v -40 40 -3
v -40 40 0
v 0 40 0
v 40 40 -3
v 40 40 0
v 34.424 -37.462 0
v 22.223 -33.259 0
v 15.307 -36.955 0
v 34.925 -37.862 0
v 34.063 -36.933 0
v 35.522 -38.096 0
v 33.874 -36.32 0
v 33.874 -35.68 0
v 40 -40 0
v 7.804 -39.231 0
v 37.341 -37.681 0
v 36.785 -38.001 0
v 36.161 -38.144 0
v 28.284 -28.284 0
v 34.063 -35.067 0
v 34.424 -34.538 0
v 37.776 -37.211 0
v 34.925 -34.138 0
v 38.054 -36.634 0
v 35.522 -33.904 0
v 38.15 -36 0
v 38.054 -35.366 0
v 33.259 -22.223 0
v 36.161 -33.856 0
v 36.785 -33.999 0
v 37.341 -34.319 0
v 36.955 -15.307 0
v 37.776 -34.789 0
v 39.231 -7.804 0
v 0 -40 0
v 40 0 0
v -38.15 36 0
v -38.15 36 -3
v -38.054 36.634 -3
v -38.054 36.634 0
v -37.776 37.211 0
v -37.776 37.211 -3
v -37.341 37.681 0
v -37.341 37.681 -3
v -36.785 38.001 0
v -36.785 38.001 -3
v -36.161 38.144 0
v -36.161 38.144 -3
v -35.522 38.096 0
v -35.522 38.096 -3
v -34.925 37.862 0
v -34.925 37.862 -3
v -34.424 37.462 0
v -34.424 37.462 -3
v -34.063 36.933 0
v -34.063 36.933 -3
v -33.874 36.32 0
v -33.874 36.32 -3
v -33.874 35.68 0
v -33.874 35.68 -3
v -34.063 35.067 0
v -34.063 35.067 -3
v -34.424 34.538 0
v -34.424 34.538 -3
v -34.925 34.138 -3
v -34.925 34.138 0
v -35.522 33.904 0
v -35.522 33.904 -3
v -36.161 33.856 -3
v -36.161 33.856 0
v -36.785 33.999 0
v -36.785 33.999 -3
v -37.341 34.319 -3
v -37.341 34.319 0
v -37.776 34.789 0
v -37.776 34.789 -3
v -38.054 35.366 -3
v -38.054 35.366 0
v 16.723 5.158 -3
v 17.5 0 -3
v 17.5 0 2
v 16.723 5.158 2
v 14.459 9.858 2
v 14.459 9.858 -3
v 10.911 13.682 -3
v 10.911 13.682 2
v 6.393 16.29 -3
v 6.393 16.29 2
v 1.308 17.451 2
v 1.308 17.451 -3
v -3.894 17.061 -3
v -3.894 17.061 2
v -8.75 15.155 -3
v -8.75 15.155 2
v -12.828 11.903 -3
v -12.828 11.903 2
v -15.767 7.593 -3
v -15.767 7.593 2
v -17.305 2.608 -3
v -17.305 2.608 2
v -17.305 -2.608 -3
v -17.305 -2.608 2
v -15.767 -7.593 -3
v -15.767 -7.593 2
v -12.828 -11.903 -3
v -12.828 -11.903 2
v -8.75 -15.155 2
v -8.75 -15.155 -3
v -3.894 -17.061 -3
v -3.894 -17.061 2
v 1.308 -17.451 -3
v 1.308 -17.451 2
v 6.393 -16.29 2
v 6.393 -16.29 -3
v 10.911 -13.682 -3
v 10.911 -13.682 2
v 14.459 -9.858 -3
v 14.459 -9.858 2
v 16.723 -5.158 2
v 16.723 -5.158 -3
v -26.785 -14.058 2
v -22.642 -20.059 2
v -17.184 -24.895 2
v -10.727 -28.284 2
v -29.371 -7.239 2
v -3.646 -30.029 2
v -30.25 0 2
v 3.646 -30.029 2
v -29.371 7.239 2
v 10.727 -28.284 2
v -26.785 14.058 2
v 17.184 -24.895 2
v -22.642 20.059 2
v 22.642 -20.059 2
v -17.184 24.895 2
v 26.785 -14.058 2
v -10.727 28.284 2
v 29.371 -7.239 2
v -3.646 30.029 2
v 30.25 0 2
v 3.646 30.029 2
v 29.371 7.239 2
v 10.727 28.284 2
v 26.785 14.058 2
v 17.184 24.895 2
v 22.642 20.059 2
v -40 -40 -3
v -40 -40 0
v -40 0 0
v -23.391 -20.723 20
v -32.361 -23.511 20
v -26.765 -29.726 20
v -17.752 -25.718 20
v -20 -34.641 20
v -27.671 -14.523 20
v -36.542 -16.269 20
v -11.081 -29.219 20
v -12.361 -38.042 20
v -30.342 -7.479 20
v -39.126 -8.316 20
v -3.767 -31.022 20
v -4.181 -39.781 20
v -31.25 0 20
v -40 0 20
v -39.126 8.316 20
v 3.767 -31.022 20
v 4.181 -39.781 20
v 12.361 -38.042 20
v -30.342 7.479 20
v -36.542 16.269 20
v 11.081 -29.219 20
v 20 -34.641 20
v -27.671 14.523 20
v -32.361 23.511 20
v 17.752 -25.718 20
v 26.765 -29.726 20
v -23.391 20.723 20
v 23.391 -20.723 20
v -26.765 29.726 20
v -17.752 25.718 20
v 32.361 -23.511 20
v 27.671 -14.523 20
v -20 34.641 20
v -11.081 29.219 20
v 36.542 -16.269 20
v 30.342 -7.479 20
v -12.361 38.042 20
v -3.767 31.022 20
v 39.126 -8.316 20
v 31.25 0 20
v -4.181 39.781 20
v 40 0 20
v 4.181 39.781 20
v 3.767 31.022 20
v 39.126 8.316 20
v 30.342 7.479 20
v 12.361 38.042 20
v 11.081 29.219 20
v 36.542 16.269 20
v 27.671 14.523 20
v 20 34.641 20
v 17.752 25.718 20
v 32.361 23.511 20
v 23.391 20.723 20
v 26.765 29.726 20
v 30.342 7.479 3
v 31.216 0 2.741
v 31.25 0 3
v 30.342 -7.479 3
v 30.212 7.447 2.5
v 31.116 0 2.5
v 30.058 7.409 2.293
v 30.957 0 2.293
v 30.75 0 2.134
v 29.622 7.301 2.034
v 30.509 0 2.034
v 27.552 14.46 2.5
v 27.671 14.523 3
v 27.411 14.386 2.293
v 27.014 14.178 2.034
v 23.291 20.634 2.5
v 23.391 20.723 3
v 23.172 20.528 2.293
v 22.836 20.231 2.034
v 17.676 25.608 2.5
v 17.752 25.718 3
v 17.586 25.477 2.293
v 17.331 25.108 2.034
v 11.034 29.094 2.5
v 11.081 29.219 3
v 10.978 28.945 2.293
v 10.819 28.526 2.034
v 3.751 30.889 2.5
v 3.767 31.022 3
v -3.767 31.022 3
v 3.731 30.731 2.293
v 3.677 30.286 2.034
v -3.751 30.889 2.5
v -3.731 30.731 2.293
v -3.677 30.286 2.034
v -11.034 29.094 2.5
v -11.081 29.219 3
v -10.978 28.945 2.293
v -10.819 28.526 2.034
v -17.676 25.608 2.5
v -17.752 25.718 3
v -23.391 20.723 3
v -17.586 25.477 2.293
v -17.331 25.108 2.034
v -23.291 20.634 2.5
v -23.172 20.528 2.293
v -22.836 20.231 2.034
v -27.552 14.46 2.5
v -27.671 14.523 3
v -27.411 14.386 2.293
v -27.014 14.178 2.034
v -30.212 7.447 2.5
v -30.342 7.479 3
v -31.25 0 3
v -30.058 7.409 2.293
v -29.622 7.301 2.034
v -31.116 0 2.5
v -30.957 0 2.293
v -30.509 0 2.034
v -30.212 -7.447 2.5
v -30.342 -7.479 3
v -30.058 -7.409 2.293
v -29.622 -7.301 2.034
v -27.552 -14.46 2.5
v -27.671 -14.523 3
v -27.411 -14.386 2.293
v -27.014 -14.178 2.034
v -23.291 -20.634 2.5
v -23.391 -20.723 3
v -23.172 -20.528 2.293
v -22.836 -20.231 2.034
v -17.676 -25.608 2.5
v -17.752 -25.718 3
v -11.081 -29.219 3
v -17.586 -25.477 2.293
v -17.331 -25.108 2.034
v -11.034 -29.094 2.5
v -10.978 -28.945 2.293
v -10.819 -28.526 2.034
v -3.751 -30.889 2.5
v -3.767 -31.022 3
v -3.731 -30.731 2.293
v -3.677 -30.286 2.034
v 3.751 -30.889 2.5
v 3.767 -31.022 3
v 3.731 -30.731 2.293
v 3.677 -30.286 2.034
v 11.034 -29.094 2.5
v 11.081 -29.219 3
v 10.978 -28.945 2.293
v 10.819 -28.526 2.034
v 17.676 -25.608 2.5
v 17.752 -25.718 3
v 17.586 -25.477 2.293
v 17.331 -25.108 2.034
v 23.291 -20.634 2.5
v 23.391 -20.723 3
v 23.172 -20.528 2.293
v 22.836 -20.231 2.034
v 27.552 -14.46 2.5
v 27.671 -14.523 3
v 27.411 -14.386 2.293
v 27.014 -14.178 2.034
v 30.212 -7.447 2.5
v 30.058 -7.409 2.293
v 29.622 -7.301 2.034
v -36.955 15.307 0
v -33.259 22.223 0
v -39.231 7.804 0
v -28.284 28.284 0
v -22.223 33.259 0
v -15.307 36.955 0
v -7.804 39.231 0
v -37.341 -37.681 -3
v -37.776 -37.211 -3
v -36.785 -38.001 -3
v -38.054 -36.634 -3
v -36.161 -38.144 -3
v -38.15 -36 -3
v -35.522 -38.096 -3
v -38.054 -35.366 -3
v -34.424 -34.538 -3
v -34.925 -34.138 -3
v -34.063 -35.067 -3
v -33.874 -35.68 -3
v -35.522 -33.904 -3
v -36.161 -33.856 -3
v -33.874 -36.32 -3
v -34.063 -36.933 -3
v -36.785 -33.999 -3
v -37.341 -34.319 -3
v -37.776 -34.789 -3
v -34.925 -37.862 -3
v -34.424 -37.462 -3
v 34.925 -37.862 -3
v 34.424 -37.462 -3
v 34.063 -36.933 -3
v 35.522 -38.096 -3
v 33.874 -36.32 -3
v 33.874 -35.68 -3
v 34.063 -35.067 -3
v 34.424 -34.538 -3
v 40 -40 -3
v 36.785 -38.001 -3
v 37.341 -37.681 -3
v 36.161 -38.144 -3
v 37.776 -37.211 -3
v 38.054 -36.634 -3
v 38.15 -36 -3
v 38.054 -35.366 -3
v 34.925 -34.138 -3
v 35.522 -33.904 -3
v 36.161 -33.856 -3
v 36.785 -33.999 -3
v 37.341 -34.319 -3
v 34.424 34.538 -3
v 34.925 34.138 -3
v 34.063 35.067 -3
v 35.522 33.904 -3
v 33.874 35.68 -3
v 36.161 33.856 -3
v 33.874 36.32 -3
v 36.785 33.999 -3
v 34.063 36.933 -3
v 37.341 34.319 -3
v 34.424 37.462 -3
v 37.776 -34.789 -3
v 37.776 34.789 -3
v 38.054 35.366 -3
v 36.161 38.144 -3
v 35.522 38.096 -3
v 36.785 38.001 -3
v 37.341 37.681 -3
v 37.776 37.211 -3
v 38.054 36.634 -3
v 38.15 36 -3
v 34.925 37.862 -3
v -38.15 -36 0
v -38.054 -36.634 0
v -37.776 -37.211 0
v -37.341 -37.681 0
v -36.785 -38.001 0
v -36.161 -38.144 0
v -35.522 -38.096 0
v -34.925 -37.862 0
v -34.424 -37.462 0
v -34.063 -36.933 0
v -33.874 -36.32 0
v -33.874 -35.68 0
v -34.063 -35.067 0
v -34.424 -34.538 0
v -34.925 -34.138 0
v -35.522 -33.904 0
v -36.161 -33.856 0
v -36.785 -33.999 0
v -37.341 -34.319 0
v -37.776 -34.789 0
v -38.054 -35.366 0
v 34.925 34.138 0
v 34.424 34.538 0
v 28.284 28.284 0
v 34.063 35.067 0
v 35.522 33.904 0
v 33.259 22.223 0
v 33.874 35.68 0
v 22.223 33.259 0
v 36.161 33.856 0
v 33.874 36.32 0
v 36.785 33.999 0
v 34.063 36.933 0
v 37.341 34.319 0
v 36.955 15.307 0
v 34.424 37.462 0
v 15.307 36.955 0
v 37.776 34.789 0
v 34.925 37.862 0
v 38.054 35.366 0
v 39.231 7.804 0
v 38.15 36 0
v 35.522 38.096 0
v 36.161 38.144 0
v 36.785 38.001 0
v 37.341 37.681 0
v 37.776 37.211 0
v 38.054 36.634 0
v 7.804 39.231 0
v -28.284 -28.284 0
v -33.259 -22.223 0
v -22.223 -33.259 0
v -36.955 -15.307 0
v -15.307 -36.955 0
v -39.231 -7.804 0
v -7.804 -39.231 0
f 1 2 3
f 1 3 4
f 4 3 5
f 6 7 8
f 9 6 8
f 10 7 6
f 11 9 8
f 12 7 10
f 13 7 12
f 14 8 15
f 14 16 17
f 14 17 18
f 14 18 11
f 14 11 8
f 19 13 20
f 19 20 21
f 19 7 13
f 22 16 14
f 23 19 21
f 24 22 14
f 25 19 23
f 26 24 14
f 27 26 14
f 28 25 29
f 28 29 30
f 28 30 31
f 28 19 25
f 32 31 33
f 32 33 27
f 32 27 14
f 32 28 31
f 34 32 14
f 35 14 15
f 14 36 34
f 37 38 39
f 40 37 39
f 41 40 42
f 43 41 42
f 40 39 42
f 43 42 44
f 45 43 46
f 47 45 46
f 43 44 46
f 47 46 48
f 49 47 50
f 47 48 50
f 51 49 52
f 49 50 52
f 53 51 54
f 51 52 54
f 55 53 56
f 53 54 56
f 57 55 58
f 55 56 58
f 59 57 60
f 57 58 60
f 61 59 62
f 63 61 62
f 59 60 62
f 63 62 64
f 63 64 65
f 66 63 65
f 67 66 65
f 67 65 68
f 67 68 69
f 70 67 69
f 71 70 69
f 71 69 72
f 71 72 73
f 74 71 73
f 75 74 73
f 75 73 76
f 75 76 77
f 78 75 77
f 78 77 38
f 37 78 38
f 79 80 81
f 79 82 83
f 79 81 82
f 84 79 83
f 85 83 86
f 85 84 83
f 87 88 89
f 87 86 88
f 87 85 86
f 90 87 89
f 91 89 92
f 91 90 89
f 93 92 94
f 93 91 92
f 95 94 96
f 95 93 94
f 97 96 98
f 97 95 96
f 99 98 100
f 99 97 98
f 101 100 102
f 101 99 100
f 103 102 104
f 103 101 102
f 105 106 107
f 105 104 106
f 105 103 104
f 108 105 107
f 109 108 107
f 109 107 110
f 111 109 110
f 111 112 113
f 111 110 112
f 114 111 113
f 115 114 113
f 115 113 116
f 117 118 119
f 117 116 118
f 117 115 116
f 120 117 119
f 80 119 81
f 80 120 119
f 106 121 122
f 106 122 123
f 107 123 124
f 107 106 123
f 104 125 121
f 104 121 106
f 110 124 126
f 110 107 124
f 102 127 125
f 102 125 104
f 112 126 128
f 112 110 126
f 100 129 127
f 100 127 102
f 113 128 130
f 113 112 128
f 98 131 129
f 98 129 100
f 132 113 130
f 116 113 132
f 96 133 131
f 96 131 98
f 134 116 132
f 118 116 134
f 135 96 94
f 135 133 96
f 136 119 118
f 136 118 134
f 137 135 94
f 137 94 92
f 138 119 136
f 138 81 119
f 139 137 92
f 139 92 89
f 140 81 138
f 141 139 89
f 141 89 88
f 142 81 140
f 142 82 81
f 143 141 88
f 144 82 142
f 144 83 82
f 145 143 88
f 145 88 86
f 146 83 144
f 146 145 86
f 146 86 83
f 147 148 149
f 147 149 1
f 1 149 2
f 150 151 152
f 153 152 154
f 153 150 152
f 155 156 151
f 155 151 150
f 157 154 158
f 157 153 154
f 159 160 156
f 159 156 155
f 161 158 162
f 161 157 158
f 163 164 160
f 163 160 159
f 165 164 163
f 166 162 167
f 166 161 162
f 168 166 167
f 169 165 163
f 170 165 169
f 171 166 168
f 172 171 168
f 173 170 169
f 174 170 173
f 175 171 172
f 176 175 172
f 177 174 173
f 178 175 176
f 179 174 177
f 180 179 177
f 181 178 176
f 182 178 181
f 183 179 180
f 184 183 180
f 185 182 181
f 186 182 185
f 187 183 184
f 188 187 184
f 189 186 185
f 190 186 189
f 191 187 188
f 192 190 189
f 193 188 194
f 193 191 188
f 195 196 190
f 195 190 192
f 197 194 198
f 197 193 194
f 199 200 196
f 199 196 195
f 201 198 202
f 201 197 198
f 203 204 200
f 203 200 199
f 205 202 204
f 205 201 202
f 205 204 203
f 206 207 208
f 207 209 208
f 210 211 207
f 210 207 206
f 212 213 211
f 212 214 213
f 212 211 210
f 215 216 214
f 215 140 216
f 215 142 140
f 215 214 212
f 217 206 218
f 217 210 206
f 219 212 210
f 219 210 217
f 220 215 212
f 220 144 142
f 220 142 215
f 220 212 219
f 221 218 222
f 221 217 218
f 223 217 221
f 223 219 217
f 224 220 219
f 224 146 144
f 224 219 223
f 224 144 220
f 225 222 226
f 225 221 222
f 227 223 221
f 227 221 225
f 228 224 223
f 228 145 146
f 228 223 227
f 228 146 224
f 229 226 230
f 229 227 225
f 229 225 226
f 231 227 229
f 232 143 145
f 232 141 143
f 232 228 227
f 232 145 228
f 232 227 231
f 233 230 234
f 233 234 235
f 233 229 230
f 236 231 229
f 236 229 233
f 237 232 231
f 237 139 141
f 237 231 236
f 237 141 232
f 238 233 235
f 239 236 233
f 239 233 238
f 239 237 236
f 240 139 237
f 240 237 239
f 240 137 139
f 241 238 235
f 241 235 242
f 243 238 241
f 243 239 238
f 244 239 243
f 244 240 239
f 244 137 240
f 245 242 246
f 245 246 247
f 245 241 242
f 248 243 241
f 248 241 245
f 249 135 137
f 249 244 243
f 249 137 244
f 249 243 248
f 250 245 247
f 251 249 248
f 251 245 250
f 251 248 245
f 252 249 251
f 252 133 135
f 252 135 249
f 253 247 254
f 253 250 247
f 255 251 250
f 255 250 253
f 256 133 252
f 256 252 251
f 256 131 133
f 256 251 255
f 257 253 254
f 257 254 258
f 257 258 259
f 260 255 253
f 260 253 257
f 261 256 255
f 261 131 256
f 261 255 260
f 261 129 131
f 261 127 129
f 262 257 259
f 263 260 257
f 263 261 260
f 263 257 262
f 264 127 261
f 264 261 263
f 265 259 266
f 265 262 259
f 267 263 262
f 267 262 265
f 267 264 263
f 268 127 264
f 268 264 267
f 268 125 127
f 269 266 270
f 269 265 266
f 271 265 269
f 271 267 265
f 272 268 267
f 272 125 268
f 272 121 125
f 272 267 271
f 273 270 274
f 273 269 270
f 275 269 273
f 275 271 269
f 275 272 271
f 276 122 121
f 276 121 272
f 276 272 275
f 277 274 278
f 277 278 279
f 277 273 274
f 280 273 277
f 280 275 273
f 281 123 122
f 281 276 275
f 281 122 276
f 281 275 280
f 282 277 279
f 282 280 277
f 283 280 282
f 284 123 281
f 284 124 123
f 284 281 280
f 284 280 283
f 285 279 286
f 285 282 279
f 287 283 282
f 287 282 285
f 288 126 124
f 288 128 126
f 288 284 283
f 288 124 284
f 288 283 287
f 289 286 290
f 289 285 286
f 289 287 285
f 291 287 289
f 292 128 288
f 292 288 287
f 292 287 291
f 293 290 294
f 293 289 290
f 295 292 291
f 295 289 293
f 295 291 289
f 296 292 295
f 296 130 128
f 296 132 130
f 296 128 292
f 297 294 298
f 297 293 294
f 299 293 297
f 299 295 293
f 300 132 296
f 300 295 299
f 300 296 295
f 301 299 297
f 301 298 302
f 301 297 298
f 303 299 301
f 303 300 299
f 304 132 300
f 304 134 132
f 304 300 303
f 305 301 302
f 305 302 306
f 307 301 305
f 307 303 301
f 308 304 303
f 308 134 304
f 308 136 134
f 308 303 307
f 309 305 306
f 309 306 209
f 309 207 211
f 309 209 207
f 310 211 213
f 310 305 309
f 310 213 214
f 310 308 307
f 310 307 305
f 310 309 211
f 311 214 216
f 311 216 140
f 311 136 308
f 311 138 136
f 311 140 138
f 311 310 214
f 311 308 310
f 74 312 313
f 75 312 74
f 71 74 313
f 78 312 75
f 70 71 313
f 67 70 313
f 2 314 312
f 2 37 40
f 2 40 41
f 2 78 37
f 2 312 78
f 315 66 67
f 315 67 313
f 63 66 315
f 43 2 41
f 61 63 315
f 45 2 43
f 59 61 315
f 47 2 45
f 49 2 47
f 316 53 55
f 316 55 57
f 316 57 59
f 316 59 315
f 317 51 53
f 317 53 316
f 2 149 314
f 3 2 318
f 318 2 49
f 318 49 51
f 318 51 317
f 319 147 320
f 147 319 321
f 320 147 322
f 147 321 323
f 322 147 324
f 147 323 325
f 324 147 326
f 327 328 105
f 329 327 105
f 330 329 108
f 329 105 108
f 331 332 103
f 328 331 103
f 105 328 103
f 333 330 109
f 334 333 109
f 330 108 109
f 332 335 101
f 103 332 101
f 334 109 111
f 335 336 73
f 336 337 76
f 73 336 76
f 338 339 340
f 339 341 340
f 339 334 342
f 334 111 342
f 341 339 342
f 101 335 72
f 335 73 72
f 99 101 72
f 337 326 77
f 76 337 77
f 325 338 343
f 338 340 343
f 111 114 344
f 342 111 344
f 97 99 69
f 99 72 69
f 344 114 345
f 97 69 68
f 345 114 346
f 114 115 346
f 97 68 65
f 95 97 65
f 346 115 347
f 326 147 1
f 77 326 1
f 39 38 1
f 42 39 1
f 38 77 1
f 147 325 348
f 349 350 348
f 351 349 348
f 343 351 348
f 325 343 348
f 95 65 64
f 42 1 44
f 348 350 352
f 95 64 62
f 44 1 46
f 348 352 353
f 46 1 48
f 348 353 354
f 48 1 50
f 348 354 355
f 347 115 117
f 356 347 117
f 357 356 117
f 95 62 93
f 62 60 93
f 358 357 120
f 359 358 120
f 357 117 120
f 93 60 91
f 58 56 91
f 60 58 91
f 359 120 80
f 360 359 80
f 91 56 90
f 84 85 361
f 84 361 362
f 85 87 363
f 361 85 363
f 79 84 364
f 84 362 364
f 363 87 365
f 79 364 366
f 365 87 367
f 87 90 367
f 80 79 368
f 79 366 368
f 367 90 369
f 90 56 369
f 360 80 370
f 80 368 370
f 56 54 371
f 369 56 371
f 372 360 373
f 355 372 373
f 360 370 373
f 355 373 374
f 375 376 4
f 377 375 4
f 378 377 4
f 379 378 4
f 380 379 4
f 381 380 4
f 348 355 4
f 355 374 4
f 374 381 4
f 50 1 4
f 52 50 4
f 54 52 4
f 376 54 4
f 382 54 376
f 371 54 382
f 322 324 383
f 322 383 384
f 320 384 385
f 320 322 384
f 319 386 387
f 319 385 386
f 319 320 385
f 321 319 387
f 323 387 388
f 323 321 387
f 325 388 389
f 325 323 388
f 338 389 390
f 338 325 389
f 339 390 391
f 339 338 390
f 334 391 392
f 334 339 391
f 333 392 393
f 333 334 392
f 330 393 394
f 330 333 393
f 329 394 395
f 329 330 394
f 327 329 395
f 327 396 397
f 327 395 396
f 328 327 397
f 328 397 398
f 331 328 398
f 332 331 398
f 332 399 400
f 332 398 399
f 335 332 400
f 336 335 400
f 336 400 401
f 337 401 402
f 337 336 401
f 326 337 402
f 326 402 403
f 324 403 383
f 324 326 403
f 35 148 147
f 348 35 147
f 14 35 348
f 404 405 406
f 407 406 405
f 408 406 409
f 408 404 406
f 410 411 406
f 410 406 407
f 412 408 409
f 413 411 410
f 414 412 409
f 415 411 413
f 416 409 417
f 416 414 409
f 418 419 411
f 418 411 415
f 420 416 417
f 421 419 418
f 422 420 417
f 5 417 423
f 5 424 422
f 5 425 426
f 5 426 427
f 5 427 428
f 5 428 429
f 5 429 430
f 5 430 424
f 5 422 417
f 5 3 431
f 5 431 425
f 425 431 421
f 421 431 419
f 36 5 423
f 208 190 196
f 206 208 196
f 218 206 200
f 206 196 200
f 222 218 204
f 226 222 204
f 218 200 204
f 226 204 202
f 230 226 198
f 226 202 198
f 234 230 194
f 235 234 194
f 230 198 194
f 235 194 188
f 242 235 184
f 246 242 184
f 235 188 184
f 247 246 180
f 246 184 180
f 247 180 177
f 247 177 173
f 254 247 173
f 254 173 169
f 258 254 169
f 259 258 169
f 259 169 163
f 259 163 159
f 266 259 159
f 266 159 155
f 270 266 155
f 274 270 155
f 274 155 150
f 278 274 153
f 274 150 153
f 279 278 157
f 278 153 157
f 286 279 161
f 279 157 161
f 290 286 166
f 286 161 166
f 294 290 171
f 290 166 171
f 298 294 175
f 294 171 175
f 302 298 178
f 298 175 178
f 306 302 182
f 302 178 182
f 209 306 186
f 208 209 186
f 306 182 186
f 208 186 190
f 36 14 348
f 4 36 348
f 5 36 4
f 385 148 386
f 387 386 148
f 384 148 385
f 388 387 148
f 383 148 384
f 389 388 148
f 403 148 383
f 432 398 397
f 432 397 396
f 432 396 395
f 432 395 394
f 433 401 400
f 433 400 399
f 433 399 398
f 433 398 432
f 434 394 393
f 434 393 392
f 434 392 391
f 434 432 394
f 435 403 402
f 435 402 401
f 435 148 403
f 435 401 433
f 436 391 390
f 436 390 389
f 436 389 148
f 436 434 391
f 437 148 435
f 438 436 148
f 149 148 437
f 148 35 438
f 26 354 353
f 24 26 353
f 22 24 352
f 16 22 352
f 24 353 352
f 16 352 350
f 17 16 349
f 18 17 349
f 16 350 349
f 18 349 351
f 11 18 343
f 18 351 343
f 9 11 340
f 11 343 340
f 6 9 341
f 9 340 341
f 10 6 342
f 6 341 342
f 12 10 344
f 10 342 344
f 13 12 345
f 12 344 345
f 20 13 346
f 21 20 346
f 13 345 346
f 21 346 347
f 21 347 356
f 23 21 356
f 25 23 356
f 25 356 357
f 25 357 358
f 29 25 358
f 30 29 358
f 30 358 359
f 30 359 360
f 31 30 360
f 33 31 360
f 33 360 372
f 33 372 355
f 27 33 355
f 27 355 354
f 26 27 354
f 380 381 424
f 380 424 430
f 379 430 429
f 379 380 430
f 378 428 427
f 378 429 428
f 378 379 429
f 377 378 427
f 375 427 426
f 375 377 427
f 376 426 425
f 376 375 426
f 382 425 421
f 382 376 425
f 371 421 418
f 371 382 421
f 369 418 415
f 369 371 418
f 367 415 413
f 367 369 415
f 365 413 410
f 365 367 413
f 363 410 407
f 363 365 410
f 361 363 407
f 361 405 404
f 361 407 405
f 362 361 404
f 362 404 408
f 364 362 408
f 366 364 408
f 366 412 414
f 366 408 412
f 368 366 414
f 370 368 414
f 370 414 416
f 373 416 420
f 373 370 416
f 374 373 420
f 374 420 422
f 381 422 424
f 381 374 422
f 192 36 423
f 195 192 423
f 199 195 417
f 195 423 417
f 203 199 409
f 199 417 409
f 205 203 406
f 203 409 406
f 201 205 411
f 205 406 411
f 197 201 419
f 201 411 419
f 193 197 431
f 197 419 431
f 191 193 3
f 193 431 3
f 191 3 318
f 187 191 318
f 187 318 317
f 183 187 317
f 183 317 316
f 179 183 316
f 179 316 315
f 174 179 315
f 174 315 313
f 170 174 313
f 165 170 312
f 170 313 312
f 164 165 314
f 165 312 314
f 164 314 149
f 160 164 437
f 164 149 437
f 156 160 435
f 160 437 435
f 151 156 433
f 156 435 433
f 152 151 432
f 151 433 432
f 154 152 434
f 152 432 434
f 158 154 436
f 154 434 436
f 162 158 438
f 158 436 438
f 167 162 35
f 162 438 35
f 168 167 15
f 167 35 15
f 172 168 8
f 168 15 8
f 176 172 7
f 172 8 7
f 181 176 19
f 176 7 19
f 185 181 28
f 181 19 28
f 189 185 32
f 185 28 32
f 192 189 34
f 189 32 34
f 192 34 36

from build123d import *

# Parameters (mm, degrees)
ESQUISSE1_R                  = 40
BOSS_EXTRU_1_DEPTH           = 20
ENL_V_START                  = 20
ESQUISSE2_R                  = 31.25
ENL_V_MAT_EXTRU_1_DEPTH      = 18
CONG_3_R                     = 1
ESQUISSE4_W                  = 80
ESQUISSE4_H                  = 80
BOSS_EXTRU_2_DEPTH           = 3
ENL_V_MAT_EXTRU_2_DEPTH      = 61
ENL_V_MAT_EXTRU_2_DEPTH_BACK = 61
ESQUISSE5_R                  = 17.5
D_GAGEMENT_M41_D             = 4.3
SYM_TRIE2_COPY_1_D           = 4.3


with BuildPart() as part:
    # Esquisse1 → Boss.-Extru.1 (new body)
    with BuildSketch(Plane.XY):
        Circle(ESQUISSE1_R)
    extrude(amount=BOSS_EXTRU_1_DEPTH)

    # Esquisse2 → Enlèv. mat.-Extru.1 (cut)
    with BuildSketch(Plane.XY.offset(ENL_V_START)):
        Circle(ESQUISSE2_R)
    extrude(amount=-ENL_V_MAT_EXTRU_1_DEPTH, mode=Mode.SUBTRACT)

    # Congé3
    cong_3_edges = [part.edges().sort_by_distance(p)[0] for p in [
        (-31.25, 0, 2),
    ]]
    fillet(cong_3_edges, radius=CONG_3_R)

    # Esquisse4 → Boss.-Extru.2 (add)
    with BuildSketch(Plane.XY):
        Rectangle(ESQUISSE4_W, ESQUISSE4_H)
    extrude(amount=-BOSS_EXTRU_2_DEPTH)

    # Esquisse5 → Enlèv. mat.-Extru.2 (cut, two sides: drawn at the far end of the back side and taken through both)
    with BuildSketch(Plane.XY.offset(-ENL_V_MAT_EXTRU_2_DEPTH_BACK)):
        Circle(ESQUISSE5_R)
    extrude(amount=ENL_V_MAT_EXTRU_2_DEPTH + ENL_V_MAT_EXTRU_2_DEPTH_BACK, mode=Mode.SUBTRACT)

    # Dégagement M41 (through all)
    with Locations(Plane(origin=(-36, 36, 0), x_dir=(1, 0, 0), z_dir=(0, 0, 1))):
        with Locations((0, 0)):
            d_gagement_m41 = Hole(D_GAGEMENT_M41_D / 2)

    # Symétrie1: Dégagement M41 across plane
    add(d_gagement_m41.mirror(Plane(origin=(0, 0, 0), x_dir=(0, 0, 1), z_dir=(1, 0, 0))), mode=Mode.SUBTRACT)

    # Symétrie2: Dégagement M41 across plane
    add(d_gagement_m41.mirror(Plane.ZX), mode=Mode.SUBTRACT)

    # Symétrie2 copy 1 (through all)
    with Locations(Plane(origin=(36, -36, 0), x_dir=(-1, 0, 0), z_dir=(0, 0, 1))):
        with Locations((0, 0)):
            Hole(SYM_TRIE2_COPY_1_D / 2)


solid = part.part
